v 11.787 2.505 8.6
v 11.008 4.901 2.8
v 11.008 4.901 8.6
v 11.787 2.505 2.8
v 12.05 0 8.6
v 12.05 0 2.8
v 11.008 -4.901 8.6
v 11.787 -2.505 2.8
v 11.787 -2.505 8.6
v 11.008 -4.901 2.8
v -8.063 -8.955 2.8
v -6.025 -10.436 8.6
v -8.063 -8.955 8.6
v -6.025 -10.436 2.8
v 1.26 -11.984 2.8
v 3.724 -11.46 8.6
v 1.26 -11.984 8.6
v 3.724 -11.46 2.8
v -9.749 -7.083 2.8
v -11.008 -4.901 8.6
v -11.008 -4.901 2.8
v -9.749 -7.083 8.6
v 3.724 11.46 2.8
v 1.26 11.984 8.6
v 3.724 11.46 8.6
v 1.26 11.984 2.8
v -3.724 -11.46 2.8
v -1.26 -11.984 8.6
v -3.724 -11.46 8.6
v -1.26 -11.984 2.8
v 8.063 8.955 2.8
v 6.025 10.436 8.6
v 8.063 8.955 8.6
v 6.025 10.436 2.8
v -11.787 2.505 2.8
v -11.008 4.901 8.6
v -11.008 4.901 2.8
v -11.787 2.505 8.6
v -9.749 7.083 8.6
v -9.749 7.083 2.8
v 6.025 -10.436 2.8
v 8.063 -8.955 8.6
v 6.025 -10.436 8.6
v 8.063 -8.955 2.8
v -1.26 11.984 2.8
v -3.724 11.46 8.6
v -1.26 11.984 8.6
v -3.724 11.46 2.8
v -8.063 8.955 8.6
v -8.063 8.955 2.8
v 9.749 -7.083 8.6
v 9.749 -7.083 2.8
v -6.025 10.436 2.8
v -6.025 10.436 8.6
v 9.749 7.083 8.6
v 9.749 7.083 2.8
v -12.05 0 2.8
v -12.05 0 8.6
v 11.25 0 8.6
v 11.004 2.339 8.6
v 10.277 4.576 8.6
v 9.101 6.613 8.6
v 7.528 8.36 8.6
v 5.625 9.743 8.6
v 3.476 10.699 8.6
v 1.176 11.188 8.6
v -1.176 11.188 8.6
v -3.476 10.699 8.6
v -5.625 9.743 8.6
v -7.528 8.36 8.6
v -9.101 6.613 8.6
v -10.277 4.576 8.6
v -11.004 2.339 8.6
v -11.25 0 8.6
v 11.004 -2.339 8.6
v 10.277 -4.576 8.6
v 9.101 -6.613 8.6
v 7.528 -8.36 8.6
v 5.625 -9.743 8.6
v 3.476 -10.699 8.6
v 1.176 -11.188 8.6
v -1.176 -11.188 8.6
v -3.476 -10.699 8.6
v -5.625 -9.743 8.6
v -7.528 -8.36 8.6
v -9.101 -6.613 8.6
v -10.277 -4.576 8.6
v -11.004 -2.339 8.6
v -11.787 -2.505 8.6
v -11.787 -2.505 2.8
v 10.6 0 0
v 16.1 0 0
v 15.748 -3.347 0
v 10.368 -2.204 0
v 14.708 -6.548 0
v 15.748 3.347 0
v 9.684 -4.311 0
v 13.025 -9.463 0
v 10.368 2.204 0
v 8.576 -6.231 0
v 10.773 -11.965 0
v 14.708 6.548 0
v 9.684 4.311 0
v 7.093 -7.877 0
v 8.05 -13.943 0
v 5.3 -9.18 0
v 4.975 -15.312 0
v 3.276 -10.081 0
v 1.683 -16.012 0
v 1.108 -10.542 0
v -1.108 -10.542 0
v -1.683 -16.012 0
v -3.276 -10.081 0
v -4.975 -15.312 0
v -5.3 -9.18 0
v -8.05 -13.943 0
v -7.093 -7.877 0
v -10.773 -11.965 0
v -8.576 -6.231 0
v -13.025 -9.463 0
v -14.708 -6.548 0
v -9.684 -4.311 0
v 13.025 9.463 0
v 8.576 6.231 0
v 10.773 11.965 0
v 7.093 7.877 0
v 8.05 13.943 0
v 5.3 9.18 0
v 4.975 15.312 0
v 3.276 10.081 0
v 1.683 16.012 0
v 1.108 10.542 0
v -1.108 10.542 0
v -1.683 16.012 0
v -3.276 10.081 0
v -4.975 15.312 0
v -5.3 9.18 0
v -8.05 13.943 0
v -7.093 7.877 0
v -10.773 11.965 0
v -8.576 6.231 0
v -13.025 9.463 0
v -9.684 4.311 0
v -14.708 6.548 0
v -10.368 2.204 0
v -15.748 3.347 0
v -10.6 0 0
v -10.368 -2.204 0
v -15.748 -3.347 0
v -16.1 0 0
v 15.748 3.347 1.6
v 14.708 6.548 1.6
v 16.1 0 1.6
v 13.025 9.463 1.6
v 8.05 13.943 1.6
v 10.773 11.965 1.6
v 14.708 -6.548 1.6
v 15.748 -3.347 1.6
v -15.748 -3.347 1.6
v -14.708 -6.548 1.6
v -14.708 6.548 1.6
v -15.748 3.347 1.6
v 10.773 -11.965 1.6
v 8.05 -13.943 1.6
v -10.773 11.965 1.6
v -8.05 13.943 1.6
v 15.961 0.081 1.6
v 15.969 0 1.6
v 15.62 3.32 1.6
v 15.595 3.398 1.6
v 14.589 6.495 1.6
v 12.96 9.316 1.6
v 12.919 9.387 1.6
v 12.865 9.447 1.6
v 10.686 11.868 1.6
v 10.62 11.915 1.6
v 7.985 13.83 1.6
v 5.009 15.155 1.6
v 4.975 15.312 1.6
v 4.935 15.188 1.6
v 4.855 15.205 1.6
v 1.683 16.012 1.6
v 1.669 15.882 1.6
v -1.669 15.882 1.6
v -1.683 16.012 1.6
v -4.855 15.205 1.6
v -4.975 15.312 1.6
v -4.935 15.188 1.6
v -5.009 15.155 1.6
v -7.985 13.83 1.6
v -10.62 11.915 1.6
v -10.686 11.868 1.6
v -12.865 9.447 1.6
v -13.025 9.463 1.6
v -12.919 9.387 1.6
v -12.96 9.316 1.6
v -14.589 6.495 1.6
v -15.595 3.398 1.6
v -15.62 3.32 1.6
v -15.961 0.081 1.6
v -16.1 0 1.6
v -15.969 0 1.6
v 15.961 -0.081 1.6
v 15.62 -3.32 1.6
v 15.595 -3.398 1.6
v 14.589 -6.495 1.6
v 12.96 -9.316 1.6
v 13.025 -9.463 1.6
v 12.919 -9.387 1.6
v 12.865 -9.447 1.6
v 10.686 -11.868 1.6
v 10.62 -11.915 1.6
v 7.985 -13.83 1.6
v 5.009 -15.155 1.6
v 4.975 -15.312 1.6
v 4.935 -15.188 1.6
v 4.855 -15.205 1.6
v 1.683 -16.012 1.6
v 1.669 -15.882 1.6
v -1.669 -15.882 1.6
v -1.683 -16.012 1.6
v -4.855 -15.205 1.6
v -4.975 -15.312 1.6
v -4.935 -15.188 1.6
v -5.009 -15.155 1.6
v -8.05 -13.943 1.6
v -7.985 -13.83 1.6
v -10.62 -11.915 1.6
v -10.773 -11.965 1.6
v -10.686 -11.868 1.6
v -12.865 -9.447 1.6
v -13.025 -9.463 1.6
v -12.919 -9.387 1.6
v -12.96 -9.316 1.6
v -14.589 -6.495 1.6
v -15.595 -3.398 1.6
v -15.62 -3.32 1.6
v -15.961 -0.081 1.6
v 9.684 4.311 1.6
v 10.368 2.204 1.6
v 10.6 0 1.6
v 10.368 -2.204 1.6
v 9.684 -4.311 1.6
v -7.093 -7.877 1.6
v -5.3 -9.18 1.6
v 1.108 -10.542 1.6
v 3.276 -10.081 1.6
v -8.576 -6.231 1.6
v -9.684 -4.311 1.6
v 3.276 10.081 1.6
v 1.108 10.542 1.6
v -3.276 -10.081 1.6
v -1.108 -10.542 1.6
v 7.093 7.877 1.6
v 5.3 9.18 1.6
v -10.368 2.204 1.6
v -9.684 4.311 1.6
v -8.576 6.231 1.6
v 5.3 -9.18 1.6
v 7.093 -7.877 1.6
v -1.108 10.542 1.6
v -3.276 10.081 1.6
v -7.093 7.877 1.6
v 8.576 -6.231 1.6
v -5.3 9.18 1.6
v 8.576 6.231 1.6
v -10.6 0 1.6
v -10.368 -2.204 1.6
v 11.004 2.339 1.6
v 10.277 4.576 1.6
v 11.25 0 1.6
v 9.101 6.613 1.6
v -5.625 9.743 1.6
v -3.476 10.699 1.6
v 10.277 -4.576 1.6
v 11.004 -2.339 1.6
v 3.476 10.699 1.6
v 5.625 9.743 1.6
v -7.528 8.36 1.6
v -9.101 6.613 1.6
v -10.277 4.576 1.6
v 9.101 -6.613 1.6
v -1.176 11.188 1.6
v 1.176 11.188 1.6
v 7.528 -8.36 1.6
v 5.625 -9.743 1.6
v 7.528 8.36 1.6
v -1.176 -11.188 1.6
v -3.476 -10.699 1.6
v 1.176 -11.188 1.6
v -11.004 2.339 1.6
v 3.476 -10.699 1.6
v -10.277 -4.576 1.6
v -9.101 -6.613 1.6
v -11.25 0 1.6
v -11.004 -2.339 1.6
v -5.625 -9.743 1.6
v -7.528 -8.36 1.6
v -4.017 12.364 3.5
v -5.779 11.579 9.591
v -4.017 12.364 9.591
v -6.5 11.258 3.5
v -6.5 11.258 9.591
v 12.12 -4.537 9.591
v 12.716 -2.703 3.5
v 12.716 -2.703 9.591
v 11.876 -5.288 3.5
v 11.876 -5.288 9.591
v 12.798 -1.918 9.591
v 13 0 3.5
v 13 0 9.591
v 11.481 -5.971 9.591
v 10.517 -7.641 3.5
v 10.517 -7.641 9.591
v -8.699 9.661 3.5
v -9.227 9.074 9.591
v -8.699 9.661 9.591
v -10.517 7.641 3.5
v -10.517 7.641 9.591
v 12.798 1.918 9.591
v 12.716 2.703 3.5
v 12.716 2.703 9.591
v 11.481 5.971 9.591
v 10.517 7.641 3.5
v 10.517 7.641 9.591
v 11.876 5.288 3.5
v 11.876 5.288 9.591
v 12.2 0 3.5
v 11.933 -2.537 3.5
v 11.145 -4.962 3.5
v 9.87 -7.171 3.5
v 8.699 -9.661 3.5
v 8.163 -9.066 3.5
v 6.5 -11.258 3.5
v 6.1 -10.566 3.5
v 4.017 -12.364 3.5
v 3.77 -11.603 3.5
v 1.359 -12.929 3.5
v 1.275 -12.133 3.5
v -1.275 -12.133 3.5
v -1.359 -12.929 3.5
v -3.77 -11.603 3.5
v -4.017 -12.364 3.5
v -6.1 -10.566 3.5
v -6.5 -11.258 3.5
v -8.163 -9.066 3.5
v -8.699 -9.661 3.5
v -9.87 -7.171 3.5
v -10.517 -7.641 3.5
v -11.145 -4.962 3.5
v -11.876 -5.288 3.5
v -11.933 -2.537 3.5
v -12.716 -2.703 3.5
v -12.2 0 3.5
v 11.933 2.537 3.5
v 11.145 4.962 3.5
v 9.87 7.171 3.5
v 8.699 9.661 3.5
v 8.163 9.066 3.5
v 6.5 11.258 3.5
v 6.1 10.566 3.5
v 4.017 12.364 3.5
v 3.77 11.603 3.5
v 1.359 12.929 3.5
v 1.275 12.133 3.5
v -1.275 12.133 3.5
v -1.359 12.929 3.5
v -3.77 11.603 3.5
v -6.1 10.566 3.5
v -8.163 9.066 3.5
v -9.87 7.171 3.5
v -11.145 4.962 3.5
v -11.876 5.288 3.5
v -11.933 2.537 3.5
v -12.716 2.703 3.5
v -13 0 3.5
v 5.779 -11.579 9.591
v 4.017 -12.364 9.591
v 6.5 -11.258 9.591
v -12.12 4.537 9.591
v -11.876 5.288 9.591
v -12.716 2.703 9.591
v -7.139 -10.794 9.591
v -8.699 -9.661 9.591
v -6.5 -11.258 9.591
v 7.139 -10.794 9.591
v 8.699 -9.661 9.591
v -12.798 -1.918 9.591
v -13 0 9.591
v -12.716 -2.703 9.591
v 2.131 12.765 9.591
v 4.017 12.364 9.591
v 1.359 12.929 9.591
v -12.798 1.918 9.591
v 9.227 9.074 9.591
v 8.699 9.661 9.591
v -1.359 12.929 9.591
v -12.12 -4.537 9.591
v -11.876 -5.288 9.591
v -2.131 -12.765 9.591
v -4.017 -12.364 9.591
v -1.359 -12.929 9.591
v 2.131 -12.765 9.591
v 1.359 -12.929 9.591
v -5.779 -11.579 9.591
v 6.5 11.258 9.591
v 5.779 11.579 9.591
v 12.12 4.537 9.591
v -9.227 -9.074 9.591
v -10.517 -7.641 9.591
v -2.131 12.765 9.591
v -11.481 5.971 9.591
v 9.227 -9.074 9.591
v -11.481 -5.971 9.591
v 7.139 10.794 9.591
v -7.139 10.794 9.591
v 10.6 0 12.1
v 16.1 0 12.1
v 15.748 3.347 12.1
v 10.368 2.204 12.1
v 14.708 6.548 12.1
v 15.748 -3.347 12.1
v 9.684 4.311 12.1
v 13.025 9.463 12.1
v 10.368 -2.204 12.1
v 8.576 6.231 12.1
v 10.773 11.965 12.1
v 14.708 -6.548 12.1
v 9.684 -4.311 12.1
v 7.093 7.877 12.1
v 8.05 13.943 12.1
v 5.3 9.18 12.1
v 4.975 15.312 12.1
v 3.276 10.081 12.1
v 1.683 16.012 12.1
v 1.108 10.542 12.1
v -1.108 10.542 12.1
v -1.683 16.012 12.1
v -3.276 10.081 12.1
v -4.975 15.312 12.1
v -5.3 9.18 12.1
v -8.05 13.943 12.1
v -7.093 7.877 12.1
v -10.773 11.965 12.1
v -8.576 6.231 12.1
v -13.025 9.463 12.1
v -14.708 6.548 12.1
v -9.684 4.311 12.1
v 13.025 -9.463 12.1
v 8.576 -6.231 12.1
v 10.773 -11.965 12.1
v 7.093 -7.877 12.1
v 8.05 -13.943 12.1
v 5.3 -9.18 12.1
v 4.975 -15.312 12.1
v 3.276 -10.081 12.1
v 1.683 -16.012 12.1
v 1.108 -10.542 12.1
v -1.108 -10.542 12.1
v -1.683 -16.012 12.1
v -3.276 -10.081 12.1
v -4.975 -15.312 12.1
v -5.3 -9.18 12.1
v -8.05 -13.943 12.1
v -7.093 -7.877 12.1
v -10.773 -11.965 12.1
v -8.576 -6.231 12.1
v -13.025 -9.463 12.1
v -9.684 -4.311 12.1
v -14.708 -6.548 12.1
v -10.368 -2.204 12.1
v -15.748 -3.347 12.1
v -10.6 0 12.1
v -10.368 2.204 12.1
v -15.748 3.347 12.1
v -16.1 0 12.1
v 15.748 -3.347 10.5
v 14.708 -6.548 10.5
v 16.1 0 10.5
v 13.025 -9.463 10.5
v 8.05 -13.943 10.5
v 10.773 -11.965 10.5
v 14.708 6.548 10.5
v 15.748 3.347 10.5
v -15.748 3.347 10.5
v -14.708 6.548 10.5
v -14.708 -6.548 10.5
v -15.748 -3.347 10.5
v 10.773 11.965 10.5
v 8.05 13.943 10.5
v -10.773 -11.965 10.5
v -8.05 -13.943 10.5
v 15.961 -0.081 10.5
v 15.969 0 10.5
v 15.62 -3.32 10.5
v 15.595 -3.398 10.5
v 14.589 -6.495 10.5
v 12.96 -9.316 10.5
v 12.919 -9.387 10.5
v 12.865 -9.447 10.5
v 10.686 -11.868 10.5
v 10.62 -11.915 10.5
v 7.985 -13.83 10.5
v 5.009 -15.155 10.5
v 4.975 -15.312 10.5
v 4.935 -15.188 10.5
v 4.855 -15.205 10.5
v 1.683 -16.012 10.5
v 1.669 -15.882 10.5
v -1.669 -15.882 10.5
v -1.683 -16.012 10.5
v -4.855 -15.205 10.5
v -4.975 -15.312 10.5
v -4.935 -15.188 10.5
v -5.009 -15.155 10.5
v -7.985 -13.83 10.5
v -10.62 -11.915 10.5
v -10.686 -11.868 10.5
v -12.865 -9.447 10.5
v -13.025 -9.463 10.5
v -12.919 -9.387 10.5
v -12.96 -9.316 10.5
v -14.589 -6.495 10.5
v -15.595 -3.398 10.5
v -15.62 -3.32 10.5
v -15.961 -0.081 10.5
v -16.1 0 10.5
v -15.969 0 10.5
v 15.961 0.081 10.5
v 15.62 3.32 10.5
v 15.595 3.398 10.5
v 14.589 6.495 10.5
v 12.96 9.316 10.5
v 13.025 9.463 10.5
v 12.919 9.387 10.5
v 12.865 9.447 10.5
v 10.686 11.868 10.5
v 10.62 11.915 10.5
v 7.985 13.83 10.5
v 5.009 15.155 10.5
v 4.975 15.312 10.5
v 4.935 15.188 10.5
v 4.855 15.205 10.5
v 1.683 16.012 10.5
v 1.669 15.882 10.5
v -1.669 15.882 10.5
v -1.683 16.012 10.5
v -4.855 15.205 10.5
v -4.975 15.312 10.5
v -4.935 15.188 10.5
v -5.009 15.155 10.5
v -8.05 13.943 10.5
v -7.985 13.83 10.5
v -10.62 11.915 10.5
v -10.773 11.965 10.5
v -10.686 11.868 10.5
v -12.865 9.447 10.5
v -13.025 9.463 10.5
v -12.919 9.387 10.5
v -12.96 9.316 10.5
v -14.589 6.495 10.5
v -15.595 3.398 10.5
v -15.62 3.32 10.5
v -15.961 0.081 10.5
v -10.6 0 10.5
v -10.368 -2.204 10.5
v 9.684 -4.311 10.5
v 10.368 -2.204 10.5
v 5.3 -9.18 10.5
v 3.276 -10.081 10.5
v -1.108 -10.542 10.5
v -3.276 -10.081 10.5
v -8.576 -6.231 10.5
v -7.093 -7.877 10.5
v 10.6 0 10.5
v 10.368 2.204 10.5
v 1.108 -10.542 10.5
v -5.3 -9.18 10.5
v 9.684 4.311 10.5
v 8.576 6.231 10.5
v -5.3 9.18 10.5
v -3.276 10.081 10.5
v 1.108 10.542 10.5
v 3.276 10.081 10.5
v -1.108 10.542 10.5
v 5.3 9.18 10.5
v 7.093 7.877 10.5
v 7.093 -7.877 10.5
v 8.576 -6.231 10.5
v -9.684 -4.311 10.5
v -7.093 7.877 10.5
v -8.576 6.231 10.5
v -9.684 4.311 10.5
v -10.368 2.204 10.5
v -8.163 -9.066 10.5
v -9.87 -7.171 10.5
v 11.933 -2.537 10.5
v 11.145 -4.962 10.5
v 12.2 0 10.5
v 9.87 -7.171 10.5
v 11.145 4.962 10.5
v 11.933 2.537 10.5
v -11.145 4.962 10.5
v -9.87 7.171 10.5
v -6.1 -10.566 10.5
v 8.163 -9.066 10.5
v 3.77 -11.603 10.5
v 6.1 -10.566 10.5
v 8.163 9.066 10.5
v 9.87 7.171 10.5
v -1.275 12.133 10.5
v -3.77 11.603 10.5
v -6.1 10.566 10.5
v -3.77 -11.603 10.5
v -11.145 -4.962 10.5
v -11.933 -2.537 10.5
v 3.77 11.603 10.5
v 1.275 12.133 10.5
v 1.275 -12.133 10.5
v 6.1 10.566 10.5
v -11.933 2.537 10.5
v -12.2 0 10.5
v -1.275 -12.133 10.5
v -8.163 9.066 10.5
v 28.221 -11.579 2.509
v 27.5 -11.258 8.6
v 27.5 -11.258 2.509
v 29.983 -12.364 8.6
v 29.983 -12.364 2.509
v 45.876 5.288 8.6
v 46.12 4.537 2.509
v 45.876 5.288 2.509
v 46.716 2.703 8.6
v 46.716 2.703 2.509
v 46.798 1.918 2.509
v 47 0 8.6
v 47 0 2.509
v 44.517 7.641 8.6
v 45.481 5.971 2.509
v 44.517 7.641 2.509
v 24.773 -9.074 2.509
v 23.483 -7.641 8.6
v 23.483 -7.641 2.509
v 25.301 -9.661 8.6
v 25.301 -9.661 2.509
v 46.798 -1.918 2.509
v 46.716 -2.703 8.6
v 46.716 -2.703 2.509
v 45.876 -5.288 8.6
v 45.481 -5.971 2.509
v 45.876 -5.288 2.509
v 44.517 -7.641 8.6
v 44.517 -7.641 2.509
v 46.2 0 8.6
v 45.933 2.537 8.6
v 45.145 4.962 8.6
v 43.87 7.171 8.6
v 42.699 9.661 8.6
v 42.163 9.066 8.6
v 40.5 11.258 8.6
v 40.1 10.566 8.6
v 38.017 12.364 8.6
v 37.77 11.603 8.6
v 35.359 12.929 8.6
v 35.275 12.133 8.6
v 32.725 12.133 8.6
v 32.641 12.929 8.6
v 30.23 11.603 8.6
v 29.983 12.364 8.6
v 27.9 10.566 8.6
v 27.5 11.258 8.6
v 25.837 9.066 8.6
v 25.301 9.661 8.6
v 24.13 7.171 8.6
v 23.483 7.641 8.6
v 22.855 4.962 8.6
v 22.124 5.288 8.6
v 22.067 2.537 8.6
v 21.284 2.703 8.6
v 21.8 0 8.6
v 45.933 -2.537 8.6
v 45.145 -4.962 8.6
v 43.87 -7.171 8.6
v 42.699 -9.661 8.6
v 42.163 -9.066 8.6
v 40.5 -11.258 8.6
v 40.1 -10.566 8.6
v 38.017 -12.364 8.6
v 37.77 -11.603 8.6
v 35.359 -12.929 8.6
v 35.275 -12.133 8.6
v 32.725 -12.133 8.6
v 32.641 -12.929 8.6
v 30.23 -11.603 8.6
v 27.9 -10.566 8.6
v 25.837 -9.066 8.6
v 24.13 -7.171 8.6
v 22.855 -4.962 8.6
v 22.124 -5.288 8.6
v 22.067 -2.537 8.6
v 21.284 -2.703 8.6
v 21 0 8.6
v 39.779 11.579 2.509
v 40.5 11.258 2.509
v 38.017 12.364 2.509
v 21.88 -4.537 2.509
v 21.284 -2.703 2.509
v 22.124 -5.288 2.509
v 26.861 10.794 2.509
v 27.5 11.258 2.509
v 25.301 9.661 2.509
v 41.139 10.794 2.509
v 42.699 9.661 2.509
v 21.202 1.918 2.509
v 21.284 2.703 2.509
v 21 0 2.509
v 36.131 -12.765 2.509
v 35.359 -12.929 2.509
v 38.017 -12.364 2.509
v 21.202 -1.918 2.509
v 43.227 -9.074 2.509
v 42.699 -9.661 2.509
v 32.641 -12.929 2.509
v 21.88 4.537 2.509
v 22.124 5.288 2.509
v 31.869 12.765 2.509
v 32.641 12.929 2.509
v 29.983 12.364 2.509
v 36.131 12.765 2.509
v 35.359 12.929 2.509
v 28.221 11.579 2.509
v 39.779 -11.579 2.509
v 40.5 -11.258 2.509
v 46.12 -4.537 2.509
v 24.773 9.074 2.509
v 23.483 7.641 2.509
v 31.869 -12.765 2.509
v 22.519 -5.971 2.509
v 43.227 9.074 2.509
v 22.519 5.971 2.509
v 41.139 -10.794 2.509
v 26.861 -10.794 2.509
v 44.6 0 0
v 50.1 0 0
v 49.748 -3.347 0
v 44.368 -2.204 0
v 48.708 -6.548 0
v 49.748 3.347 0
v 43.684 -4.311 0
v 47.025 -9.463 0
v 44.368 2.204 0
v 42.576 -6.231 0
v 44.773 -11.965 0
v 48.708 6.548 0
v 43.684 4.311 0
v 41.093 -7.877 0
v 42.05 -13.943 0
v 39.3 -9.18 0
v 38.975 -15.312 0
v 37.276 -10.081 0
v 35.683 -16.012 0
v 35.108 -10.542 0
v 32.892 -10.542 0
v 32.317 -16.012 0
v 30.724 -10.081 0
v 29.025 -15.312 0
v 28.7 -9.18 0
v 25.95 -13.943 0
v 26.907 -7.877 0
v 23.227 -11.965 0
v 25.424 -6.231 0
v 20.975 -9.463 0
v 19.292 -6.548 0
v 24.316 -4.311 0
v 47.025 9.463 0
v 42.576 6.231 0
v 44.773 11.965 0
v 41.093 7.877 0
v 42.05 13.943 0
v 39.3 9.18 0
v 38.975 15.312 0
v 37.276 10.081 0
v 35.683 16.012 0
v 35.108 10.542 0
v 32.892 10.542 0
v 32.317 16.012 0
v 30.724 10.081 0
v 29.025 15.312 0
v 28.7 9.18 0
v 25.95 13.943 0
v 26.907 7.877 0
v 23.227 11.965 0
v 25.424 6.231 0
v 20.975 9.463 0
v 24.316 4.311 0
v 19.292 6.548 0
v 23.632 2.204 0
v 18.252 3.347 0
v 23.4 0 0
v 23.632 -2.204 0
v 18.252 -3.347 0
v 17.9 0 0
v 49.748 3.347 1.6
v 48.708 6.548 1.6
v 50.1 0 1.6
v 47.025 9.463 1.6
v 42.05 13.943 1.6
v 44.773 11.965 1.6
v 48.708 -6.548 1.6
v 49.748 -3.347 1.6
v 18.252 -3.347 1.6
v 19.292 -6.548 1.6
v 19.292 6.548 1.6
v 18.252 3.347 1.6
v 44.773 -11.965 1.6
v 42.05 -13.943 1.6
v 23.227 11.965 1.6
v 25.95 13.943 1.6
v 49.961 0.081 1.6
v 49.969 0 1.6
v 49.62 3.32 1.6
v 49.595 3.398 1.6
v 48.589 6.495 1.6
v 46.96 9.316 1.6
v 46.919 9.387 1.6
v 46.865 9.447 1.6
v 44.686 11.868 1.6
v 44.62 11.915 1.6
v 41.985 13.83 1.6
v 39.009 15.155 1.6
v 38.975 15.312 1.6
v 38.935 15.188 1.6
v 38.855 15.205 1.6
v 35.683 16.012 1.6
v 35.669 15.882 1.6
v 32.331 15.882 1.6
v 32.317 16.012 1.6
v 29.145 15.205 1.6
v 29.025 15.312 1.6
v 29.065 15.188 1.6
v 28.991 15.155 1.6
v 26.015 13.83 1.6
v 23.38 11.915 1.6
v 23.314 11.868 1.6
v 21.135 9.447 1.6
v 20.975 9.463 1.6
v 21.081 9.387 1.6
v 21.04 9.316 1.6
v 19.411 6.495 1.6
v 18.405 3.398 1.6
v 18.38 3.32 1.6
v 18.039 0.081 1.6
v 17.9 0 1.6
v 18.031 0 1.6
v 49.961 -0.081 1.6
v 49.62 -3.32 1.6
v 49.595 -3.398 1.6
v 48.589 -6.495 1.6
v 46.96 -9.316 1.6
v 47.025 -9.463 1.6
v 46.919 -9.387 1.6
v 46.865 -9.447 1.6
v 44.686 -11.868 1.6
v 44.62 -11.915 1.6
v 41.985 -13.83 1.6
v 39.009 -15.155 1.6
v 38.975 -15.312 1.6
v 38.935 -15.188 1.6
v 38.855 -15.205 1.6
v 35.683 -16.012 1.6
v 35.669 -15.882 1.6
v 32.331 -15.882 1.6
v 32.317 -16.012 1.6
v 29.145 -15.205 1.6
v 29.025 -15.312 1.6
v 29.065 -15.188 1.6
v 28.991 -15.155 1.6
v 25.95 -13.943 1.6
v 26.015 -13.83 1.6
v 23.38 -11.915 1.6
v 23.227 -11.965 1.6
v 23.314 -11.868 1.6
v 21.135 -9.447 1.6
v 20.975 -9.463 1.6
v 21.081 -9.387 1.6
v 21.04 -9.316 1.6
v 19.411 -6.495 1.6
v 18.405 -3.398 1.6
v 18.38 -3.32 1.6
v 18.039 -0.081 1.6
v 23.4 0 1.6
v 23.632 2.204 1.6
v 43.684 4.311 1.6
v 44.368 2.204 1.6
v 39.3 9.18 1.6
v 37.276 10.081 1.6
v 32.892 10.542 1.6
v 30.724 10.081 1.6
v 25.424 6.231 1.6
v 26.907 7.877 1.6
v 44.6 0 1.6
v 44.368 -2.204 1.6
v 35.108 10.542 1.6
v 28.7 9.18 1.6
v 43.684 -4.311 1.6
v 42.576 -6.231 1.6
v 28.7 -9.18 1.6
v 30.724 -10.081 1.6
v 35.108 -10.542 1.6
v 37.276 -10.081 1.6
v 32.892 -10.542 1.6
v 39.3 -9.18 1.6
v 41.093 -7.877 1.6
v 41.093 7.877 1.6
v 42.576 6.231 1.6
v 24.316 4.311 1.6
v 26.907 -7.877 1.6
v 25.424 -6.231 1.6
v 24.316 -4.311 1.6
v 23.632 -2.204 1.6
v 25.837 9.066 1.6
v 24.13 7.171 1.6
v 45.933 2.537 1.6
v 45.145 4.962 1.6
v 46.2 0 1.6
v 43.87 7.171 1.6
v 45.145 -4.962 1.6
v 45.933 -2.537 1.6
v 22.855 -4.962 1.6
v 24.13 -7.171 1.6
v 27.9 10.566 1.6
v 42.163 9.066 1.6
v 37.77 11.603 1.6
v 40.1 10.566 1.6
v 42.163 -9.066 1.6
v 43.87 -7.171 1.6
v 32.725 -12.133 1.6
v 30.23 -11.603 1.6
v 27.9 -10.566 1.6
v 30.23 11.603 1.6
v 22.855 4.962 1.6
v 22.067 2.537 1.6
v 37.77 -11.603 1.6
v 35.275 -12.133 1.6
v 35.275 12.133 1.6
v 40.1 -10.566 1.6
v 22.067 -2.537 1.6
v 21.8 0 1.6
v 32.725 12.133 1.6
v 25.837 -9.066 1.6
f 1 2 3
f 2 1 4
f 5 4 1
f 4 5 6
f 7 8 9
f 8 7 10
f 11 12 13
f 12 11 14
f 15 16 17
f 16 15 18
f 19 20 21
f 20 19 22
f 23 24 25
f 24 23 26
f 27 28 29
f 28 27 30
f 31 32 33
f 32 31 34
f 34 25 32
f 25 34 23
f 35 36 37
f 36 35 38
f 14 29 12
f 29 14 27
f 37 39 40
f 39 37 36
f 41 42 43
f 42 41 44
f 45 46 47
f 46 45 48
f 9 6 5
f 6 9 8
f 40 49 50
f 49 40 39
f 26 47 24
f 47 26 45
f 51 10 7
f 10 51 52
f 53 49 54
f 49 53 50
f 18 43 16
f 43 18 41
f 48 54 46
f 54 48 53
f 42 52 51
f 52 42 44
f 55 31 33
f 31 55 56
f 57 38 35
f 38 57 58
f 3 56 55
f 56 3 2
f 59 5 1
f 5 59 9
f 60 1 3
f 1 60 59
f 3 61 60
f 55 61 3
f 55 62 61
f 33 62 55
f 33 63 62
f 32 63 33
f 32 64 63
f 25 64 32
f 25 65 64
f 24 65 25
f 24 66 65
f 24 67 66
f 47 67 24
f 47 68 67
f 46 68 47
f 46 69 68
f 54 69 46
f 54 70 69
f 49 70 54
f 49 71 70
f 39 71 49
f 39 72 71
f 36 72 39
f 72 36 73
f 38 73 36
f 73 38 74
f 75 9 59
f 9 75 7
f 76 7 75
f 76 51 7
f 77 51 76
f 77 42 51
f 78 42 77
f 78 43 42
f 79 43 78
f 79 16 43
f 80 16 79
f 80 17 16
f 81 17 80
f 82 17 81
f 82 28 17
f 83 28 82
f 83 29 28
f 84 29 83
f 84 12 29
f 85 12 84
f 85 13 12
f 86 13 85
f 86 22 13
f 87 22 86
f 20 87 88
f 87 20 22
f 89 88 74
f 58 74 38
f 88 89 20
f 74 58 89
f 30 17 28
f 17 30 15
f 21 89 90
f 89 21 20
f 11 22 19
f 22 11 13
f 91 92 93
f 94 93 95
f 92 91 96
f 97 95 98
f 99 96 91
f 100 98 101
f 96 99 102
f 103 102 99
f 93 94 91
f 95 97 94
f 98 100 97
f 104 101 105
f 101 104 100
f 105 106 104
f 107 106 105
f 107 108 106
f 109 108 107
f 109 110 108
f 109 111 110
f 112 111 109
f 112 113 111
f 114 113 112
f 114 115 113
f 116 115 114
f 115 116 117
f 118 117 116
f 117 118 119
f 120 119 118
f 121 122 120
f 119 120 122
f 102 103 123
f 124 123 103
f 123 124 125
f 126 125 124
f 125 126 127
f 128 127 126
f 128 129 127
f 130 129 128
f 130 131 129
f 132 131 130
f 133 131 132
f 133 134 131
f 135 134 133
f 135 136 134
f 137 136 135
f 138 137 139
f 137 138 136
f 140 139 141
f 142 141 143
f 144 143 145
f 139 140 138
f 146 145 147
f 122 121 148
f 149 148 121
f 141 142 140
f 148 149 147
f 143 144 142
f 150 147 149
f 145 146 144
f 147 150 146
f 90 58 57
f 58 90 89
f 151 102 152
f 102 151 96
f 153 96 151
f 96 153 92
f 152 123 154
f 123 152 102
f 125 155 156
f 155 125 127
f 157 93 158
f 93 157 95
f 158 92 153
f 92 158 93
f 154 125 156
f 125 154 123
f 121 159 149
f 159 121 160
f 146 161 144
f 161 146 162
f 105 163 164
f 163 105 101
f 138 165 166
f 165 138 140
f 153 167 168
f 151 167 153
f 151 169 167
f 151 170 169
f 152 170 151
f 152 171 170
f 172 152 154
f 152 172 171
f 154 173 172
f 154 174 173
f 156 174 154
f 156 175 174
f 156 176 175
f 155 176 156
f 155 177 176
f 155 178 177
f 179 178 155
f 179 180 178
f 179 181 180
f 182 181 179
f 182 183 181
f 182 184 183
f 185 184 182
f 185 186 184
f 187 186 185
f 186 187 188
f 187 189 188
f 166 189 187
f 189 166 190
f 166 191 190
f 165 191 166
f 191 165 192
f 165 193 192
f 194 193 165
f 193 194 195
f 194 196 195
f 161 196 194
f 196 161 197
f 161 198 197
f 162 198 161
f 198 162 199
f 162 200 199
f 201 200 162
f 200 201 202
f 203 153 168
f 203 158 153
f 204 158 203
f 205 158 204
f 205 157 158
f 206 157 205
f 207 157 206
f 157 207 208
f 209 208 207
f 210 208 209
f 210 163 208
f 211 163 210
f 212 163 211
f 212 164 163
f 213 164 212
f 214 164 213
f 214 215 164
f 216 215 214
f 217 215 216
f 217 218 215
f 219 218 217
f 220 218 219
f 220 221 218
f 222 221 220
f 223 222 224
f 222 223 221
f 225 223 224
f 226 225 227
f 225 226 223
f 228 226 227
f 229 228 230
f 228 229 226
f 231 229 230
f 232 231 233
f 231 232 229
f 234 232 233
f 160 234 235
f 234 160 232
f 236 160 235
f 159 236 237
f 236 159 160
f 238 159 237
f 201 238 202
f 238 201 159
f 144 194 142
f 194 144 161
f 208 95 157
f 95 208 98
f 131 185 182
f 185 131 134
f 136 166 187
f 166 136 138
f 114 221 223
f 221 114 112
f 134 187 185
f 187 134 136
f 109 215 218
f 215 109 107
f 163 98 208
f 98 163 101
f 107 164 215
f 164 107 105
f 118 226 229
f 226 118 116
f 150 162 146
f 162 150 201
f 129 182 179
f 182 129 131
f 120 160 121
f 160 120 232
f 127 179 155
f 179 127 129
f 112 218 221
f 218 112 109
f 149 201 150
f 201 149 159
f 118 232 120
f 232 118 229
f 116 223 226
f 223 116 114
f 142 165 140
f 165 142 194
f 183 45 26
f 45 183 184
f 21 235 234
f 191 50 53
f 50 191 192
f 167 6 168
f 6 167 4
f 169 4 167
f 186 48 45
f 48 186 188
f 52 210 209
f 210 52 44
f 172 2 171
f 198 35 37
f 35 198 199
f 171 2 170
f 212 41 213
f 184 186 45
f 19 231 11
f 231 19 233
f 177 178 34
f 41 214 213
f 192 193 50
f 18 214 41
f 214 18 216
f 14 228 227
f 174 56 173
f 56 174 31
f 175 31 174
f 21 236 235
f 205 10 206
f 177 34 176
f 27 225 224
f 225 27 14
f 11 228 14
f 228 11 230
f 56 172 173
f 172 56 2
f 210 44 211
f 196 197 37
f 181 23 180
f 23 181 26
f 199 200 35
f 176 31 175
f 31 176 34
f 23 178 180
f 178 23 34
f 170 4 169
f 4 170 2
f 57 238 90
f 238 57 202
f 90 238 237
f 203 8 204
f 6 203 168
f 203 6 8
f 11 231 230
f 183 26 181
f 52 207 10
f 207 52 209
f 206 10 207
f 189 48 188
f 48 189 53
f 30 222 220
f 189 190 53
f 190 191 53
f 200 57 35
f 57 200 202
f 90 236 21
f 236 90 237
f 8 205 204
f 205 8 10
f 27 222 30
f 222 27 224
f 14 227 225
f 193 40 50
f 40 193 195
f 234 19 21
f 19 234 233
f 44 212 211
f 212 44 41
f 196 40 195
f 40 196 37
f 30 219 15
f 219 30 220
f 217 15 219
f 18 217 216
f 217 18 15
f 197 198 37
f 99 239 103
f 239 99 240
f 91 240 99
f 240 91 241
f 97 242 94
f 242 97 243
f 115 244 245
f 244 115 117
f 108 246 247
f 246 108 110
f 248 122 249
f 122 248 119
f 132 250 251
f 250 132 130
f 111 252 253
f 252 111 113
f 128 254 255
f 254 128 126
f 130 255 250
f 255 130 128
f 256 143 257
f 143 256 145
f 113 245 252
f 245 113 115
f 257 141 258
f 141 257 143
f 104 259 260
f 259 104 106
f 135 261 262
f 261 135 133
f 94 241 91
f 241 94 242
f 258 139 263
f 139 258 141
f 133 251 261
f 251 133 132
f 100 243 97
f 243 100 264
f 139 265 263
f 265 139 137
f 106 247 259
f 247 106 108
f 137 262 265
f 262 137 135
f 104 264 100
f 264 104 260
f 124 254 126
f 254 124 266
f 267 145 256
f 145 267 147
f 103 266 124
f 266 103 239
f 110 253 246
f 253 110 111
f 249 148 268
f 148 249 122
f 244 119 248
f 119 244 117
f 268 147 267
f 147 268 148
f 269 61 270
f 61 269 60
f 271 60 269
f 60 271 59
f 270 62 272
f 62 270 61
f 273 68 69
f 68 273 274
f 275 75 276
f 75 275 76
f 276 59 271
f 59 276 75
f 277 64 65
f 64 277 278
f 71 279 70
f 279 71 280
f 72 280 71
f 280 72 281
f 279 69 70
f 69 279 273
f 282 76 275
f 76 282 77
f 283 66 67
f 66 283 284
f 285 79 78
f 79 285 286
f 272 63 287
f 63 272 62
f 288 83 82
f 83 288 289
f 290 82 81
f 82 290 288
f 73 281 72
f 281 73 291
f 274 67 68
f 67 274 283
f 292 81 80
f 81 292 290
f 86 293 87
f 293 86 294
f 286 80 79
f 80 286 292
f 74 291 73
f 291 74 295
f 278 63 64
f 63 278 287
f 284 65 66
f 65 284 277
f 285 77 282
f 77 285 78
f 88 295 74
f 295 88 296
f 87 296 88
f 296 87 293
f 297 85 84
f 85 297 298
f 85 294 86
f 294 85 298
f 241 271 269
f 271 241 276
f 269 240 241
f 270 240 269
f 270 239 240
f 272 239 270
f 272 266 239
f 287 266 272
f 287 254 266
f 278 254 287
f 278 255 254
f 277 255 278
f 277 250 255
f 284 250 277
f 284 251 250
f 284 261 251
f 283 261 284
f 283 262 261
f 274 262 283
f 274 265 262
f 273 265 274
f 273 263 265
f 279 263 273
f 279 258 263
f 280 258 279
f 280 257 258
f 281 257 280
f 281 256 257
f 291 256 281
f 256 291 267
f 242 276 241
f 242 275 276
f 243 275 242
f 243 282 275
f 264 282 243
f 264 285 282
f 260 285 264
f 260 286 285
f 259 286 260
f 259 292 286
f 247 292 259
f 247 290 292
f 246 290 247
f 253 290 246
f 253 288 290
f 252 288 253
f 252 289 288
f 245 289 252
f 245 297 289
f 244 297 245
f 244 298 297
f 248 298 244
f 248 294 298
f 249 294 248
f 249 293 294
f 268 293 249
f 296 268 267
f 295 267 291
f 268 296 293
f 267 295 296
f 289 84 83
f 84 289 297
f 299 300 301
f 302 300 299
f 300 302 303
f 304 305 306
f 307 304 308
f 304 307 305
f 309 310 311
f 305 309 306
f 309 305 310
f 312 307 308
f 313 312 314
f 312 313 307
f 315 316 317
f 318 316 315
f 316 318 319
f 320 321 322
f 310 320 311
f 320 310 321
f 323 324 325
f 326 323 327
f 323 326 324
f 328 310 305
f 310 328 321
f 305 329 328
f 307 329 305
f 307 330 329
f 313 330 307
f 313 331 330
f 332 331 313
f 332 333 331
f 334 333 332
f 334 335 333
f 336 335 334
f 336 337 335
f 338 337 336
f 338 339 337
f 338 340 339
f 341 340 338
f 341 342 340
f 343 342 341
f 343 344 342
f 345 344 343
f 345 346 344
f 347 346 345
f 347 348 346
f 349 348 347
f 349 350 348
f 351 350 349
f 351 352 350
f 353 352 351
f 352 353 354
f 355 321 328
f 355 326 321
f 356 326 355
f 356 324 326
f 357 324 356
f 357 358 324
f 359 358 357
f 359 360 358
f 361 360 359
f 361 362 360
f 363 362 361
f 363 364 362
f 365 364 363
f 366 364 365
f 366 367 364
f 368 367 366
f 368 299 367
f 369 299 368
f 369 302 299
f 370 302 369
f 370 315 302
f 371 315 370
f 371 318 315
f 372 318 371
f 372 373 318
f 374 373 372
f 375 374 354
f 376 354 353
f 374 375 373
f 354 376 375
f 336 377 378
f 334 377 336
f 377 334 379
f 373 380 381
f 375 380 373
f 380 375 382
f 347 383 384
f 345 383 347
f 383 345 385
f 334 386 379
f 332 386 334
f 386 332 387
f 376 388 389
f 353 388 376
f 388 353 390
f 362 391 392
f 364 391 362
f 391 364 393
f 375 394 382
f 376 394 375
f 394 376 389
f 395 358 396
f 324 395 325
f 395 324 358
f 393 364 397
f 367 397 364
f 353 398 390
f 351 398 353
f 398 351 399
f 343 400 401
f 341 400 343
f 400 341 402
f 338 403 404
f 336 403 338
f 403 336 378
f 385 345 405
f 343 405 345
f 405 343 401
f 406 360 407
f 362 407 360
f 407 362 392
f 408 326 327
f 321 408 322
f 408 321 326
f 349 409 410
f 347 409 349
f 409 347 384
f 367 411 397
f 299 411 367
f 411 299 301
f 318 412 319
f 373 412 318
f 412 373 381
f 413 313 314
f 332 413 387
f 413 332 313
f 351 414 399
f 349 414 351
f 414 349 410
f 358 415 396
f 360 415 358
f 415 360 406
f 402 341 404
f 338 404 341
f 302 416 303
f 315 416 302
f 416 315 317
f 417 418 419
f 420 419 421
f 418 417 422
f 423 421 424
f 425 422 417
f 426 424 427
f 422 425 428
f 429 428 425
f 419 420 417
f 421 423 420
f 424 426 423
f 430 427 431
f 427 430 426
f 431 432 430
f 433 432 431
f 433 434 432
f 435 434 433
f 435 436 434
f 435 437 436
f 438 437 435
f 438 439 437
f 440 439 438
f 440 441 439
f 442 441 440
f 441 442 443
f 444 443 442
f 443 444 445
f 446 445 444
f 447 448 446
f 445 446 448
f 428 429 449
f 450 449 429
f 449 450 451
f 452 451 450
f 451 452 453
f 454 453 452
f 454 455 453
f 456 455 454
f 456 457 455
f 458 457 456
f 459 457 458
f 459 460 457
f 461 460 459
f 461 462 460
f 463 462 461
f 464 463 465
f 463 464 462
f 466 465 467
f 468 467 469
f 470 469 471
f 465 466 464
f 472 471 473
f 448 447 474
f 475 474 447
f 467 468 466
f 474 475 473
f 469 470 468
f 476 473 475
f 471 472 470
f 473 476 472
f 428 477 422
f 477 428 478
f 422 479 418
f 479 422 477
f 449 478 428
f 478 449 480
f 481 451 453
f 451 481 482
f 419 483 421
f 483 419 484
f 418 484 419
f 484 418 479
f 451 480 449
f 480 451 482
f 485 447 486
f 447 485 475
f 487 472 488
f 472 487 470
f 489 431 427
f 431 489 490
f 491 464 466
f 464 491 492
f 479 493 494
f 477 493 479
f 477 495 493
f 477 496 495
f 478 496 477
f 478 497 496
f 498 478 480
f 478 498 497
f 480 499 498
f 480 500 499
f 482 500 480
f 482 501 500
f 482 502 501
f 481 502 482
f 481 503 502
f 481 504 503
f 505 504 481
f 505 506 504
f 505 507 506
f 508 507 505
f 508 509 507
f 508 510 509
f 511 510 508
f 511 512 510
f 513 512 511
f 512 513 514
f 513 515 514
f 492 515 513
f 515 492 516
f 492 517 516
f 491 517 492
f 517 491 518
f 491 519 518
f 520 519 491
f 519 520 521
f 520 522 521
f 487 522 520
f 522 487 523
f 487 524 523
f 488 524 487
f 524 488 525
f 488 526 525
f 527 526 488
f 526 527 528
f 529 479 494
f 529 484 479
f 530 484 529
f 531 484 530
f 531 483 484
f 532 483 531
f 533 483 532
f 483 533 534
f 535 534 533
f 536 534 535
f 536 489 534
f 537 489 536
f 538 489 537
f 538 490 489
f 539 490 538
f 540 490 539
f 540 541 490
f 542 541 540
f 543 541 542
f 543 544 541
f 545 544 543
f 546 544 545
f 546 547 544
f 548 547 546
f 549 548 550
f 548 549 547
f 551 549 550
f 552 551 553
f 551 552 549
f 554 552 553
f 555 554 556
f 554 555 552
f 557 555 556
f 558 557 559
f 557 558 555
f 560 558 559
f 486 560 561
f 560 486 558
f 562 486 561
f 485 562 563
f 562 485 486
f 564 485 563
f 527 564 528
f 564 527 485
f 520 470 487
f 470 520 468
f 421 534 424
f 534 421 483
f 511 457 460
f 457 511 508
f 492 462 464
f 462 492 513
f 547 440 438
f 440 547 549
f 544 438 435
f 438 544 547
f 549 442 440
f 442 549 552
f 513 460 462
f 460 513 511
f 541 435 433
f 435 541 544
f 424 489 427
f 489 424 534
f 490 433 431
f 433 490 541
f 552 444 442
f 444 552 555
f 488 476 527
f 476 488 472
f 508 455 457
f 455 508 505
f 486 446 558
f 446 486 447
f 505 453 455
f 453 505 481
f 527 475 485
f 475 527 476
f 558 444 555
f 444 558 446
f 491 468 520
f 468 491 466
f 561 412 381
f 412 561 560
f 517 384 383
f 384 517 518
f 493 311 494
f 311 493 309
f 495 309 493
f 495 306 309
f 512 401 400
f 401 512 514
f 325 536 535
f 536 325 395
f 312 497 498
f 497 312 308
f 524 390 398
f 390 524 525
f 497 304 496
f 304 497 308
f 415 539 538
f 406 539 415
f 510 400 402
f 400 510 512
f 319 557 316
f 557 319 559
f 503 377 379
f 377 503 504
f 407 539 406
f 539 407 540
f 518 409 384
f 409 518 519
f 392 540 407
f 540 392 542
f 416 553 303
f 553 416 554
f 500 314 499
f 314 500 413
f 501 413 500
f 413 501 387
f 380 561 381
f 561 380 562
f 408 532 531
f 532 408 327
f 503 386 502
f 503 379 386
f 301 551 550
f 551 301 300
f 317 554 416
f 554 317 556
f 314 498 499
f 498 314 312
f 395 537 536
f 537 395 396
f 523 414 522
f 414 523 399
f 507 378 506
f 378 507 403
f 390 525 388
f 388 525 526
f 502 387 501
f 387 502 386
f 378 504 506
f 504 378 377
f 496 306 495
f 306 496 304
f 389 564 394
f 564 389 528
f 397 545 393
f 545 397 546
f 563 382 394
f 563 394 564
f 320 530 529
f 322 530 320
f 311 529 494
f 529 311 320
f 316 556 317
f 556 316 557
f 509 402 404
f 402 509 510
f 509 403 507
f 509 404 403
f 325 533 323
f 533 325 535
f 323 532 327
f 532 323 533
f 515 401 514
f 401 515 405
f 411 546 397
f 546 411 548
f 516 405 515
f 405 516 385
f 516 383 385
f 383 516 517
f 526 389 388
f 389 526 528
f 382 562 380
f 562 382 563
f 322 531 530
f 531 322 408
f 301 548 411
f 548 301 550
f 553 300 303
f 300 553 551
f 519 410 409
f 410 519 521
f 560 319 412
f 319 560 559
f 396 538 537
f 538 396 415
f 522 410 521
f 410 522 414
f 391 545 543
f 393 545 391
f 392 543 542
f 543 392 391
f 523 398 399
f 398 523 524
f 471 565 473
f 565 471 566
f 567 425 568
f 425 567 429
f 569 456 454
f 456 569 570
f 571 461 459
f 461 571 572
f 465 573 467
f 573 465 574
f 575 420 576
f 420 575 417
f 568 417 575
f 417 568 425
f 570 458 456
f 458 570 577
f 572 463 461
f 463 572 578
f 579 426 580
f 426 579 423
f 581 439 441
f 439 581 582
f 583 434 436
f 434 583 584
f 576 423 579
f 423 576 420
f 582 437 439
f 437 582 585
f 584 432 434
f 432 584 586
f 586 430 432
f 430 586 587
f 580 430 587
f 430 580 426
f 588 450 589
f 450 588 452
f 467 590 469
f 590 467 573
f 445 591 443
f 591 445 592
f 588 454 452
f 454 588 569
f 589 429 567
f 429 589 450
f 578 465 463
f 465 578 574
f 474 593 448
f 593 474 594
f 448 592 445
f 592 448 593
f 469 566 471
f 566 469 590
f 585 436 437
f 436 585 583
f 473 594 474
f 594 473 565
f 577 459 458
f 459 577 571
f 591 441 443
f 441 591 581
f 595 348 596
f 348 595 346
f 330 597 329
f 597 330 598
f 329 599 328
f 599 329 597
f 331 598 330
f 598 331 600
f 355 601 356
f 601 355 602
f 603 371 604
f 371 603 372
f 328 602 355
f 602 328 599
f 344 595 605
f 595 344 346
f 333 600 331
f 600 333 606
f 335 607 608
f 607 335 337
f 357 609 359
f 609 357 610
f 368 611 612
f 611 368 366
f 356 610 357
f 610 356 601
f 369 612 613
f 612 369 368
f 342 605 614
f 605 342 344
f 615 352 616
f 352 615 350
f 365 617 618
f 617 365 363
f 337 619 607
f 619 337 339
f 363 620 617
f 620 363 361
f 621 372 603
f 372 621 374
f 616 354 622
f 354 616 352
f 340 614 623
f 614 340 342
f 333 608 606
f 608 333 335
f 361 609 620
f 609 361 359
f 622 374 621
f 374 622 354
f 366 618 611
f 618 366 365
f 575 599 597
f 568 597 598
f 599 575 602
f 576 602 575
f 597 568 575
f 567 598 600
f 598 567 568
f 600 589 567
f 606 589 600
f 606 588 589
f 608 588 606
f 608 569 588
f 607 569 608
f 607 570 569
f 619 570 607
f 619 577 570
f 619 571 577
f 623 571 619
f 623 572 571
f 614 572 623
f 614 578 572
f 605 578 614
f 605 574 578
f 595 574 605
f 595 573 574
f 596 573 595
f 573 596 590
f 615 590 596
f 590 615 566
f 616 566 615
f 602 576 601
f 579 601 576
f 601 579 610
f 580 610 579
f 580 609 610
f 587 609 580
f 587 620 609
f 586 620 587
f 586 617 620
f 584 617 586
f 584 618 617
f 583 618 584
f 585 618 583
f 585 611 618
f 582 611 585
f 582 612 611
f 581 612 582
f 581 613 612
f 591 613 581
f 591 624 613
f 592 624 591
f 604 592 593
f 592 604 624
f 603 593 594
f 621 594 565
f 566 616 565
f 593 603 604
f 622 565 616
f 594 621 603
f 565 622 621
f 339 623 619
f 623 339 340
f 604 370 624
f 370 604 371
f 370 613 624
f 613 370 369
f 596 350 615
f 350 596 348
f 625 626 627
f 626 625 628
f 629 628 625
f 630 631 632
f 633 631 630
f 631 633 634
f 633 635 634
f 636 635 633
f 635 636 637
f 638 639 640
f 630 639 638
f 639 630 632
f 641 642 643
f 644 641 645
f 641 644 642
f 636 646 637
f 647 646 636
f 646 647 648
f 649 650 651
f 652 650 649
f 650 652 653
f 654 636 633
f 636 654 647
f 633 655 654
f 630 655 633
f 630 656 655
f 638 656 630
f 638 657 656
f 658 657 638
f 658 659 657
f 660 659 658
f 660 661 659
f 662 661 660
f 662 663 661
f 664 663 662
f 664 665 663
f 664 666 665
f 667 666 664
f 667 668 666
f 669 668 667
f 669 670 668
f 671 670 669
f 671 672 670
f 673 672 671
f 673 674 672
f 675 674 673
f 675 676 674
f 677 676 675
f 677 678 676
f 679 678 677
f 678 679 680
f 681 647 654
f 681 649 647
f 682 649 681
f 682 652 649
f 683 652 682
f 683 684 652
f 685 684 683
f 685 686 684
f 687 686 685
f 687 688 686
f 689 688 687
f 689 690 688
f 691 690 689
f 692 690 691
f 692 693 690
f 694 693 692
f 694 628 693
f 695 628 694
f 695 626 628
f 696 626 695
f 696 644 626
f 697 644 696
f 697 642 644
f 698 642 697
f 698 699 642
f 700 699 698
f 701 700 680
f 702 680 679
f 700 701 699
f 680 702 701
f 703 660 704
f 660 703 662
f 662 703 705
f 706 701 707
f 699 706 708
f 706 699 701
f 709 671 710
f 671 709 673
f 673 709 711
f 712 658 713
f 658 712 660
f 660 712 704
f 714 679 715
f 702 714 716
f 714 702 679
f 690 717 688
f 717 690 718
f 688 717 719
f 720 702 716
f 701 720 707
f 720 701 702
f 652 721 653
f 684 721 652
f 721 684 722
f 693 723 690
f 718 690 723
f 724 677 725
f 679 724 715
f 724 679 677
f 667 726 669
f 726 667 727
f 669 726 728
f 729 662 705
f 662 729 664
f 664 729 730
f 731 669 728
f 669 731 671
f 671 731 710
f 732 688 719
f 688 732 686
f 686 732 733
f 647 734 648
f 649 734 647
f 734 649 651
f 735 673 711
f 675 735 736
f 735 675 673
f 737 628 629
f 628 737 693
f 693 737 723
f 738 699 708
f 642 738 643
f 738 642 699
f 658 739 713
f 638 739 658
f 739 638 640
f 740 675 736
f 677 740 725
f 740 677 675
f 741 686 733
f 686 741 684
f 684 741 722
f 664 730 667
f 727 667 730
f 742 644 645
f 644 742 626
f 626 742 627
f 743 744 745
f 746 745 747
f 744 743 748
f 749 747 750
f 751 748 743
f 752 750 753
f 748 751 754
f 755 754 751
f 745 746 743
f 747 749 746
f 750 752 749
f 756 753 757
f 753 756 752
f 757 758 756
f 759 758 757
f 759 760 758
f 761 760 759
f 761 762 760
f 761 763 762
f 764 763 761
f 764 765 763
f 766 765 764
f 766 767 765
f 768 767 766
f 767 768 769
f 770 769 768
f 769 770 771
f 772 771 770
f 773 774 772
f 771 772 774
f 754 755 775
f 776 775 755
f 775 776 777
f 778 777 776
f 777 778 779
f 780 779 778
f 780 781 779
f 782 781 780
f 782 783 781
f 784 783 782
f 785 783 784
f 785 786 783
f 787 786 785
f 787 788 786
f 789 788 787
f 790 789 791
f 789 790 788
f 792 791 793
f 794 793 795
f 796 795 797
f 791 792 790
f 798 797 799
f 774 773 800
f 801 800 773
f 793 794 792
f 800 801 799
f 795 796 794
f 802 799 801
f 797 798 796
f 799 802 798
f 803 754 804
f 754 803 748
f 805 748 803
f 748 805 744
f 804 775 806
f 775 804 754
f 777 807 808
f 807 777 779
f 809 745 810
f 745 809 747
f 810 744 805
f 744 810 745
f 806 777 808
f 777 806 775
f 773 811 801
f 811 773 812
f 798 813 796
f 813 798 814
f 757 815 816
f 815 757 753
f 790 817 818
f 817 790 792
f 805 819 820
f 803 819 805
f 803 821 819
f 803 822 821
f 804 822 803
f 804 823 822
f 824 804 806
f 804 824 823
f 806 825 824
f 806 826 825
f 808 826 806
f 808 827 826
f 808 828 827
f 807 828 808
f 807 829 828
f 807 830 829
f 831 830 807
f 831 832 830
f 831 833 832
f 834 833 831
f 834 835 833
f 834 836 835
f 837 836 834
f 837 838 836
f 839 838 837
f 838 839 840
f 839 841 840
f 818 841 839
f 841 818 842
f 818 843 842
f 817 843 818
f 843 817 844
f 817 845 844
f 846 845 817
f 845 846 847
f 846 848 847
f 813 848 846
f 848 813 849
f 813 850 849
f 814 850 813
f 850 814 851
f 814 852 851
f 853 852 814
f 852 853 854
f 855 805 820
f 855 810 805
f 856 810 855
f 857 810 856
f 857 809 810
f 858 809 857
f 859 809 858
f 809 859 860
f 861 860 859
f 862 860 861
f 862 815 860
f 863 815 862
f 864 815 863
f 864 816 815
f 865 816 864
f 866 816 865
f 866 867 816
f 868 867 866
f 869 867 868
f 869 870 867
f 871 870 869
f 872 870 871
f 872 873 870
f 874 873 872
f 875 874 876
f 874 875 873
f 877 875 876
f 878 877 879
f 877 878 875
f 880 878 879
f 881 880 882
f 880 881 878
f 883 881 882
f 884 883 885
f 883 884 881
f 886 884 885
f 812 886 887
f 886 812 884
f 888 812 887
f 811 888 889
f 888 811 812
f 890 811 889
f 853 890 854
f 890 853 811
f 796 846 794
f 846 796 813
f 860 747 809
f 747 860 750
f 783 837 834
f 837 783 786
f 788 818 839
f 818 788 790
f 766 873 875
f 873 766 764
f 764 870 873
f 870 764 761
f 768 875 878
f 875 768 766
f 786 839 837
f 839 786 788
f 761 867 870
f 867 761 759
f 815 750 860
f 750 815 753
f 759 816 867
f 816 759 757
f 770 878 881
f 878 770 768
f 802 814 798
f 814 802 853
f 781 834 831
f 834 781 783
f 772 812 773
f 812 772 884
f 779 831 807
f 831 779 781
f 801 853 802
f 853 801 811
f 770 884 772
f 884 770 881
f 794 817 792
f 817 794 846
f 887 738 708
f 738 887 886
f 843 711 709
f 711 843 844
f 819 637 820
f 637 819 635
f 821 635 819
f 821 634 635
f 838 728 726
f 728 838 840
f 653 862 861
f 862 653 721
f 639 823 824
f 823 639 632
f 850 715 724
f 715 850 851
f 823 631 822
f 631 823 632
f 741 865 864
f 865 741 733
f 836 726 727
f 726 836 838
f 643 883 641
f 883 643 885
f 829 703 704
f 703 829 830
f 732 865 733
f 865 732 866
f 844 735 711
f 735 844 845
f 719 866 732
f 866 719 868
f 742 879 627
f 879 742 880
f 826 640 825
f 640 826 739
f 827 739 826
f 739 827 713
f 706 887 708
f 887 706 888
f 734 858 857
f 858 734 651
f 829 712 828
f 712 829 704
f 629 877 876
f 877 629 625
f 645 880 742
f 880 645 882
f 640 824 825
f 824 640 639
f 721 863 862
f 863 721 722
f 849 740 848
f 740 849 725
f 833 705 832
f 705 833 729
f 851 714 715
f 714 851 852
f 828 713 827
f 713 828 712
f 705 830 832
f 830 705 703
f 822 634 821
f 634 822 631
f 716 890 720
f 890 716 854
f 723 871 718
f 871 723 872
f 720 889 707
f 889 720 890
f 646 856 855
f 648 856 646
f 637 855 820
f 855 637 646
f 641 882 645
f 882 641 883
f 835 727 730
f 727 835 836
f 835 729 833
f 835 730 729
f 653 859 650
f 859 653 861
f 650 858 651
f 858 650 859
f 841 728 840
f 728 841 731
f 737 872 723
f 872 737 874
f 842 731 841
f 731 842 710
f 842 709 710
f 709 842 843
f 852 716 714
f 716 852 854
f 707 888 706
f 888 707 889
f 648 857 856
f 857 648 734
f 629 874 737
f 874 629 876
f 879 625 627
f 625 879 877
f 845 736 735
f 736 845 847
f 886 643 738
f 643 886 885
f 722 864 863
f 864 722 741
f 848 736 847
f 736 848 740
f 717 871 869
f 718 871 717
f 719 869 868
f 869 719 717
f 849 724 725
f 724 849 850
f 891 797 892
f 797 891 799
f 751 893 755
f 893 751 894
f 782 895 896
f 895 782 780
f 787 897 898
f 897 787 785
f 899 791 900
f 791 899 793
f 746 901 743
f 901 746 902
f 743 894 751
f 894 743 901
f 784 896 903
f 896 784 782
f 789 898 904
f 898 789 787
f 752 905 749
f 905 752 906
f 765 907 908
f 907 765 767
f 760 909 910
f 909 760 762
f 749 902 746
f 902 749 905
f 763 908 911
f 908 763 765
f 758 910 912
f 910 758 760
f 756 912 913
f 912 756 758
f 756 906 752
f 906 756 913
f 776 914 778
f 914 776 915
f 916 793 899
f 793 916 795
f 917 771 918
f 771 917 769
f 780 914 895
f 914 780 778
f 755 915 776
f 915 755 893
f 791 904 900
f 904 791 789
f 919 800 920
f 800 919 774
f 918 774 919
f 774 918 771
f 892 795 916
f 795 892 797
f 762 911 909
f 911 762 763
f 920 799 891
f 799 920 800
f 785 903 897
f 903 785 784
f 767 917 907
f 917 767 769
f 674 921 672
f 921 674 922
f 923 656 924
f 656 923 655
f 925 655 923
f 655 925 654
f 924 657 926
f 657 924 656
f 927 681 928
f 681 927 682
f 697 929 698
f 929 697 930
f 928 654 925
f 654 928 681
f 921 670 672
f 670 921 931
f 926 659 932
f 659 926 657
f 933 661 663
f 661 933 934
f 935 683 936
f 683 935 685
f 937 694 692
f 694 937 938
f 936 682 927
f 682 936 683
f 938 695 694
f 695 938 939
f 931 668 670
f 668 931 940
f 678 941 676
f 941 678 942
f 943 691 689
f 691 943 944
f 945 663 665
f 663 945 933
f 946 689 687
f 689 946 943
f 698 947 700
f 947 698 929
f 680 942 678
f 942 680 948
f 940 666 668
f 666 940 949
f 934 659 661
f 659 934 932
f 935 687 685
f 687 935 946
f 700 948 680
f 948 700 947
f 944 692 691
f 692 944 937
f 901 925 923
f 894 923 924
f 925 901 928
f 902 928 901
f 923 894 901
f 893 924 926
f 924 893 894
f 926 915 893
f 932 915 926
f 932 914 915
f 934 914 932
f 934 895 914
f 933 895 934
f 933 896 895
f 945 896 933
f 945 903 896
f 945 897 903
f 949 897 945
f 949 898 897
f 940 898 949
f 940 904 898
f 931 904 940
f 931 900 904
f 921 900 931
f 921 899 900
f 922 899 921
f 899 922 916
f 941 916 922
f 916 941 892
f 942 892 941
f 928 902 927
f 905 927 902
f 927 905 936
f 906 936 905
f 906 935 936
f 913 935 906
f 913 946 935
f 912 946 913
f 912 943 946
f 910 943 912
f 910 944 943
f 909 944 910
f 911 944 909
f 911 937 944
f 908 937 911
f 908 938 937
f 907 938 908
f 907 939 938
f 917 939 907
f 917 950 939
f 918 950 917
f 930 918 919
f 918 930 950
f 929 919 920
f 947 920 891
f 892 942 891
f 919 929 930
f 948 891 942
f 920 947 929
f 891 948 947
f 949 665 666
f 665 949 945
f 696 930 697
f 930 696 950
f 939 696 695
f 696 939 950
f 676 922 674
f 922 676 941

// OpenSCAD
//PRUSAMendel
//GNUGPLv2
//GregFrost

/**
*@categoryPrinted
*/

layer_height=0.4;
perimeter_w_over_t=2;

single_layer_width=layer_height*perimeter_w_over_t;
bearing_inner=22.2;

edge_thickness=layer_height*4;
slope_thickness=layer_height*3.1;
height=7+edge_thickness;
wall_ascent=5;
wall_descent=0.5;
tolerance=0.15;

module bearing_guide(inner_r=2)
{
	difference()
	{
		union()
		{
			cylinder(r=inner_r++single_layer_width,h=height);

			cylinder(r=bearing_inner/2+wall_ascent,h=edge_thickness);
			translate([0,0,edge_thickness-layer_height*0.1])
			cylinder(r1=bearing_inner/2+wall_ascent,
				r2=bearing_inner/2+single_layer_width+tolerance,
				h=slope_thickness);
		}
		translate([0,0,-1])
		cylinder(r=bearing_inner/2-wall_descent,h=edge_thickness+2);

		translate([0,0,edge_thickness])
		cylinder(r=inner_r,h=height);
	}
}

module inner()
{
	bearing_guide(inner_r=bearing_inner/2+tolerance);
}

module outer()
{
	bearing_guide(inner_r=bearing_inner/2+single_layer_width+2*+tolerance);
}


module bearGuid_ass() {
	inner();

	translate([0,0,3.5+height])
	rotate(a=180,v=[1,0,0]) 
	outer();

}
bearGuid_ass();

inner();

translate([34,0,0])
outer();
